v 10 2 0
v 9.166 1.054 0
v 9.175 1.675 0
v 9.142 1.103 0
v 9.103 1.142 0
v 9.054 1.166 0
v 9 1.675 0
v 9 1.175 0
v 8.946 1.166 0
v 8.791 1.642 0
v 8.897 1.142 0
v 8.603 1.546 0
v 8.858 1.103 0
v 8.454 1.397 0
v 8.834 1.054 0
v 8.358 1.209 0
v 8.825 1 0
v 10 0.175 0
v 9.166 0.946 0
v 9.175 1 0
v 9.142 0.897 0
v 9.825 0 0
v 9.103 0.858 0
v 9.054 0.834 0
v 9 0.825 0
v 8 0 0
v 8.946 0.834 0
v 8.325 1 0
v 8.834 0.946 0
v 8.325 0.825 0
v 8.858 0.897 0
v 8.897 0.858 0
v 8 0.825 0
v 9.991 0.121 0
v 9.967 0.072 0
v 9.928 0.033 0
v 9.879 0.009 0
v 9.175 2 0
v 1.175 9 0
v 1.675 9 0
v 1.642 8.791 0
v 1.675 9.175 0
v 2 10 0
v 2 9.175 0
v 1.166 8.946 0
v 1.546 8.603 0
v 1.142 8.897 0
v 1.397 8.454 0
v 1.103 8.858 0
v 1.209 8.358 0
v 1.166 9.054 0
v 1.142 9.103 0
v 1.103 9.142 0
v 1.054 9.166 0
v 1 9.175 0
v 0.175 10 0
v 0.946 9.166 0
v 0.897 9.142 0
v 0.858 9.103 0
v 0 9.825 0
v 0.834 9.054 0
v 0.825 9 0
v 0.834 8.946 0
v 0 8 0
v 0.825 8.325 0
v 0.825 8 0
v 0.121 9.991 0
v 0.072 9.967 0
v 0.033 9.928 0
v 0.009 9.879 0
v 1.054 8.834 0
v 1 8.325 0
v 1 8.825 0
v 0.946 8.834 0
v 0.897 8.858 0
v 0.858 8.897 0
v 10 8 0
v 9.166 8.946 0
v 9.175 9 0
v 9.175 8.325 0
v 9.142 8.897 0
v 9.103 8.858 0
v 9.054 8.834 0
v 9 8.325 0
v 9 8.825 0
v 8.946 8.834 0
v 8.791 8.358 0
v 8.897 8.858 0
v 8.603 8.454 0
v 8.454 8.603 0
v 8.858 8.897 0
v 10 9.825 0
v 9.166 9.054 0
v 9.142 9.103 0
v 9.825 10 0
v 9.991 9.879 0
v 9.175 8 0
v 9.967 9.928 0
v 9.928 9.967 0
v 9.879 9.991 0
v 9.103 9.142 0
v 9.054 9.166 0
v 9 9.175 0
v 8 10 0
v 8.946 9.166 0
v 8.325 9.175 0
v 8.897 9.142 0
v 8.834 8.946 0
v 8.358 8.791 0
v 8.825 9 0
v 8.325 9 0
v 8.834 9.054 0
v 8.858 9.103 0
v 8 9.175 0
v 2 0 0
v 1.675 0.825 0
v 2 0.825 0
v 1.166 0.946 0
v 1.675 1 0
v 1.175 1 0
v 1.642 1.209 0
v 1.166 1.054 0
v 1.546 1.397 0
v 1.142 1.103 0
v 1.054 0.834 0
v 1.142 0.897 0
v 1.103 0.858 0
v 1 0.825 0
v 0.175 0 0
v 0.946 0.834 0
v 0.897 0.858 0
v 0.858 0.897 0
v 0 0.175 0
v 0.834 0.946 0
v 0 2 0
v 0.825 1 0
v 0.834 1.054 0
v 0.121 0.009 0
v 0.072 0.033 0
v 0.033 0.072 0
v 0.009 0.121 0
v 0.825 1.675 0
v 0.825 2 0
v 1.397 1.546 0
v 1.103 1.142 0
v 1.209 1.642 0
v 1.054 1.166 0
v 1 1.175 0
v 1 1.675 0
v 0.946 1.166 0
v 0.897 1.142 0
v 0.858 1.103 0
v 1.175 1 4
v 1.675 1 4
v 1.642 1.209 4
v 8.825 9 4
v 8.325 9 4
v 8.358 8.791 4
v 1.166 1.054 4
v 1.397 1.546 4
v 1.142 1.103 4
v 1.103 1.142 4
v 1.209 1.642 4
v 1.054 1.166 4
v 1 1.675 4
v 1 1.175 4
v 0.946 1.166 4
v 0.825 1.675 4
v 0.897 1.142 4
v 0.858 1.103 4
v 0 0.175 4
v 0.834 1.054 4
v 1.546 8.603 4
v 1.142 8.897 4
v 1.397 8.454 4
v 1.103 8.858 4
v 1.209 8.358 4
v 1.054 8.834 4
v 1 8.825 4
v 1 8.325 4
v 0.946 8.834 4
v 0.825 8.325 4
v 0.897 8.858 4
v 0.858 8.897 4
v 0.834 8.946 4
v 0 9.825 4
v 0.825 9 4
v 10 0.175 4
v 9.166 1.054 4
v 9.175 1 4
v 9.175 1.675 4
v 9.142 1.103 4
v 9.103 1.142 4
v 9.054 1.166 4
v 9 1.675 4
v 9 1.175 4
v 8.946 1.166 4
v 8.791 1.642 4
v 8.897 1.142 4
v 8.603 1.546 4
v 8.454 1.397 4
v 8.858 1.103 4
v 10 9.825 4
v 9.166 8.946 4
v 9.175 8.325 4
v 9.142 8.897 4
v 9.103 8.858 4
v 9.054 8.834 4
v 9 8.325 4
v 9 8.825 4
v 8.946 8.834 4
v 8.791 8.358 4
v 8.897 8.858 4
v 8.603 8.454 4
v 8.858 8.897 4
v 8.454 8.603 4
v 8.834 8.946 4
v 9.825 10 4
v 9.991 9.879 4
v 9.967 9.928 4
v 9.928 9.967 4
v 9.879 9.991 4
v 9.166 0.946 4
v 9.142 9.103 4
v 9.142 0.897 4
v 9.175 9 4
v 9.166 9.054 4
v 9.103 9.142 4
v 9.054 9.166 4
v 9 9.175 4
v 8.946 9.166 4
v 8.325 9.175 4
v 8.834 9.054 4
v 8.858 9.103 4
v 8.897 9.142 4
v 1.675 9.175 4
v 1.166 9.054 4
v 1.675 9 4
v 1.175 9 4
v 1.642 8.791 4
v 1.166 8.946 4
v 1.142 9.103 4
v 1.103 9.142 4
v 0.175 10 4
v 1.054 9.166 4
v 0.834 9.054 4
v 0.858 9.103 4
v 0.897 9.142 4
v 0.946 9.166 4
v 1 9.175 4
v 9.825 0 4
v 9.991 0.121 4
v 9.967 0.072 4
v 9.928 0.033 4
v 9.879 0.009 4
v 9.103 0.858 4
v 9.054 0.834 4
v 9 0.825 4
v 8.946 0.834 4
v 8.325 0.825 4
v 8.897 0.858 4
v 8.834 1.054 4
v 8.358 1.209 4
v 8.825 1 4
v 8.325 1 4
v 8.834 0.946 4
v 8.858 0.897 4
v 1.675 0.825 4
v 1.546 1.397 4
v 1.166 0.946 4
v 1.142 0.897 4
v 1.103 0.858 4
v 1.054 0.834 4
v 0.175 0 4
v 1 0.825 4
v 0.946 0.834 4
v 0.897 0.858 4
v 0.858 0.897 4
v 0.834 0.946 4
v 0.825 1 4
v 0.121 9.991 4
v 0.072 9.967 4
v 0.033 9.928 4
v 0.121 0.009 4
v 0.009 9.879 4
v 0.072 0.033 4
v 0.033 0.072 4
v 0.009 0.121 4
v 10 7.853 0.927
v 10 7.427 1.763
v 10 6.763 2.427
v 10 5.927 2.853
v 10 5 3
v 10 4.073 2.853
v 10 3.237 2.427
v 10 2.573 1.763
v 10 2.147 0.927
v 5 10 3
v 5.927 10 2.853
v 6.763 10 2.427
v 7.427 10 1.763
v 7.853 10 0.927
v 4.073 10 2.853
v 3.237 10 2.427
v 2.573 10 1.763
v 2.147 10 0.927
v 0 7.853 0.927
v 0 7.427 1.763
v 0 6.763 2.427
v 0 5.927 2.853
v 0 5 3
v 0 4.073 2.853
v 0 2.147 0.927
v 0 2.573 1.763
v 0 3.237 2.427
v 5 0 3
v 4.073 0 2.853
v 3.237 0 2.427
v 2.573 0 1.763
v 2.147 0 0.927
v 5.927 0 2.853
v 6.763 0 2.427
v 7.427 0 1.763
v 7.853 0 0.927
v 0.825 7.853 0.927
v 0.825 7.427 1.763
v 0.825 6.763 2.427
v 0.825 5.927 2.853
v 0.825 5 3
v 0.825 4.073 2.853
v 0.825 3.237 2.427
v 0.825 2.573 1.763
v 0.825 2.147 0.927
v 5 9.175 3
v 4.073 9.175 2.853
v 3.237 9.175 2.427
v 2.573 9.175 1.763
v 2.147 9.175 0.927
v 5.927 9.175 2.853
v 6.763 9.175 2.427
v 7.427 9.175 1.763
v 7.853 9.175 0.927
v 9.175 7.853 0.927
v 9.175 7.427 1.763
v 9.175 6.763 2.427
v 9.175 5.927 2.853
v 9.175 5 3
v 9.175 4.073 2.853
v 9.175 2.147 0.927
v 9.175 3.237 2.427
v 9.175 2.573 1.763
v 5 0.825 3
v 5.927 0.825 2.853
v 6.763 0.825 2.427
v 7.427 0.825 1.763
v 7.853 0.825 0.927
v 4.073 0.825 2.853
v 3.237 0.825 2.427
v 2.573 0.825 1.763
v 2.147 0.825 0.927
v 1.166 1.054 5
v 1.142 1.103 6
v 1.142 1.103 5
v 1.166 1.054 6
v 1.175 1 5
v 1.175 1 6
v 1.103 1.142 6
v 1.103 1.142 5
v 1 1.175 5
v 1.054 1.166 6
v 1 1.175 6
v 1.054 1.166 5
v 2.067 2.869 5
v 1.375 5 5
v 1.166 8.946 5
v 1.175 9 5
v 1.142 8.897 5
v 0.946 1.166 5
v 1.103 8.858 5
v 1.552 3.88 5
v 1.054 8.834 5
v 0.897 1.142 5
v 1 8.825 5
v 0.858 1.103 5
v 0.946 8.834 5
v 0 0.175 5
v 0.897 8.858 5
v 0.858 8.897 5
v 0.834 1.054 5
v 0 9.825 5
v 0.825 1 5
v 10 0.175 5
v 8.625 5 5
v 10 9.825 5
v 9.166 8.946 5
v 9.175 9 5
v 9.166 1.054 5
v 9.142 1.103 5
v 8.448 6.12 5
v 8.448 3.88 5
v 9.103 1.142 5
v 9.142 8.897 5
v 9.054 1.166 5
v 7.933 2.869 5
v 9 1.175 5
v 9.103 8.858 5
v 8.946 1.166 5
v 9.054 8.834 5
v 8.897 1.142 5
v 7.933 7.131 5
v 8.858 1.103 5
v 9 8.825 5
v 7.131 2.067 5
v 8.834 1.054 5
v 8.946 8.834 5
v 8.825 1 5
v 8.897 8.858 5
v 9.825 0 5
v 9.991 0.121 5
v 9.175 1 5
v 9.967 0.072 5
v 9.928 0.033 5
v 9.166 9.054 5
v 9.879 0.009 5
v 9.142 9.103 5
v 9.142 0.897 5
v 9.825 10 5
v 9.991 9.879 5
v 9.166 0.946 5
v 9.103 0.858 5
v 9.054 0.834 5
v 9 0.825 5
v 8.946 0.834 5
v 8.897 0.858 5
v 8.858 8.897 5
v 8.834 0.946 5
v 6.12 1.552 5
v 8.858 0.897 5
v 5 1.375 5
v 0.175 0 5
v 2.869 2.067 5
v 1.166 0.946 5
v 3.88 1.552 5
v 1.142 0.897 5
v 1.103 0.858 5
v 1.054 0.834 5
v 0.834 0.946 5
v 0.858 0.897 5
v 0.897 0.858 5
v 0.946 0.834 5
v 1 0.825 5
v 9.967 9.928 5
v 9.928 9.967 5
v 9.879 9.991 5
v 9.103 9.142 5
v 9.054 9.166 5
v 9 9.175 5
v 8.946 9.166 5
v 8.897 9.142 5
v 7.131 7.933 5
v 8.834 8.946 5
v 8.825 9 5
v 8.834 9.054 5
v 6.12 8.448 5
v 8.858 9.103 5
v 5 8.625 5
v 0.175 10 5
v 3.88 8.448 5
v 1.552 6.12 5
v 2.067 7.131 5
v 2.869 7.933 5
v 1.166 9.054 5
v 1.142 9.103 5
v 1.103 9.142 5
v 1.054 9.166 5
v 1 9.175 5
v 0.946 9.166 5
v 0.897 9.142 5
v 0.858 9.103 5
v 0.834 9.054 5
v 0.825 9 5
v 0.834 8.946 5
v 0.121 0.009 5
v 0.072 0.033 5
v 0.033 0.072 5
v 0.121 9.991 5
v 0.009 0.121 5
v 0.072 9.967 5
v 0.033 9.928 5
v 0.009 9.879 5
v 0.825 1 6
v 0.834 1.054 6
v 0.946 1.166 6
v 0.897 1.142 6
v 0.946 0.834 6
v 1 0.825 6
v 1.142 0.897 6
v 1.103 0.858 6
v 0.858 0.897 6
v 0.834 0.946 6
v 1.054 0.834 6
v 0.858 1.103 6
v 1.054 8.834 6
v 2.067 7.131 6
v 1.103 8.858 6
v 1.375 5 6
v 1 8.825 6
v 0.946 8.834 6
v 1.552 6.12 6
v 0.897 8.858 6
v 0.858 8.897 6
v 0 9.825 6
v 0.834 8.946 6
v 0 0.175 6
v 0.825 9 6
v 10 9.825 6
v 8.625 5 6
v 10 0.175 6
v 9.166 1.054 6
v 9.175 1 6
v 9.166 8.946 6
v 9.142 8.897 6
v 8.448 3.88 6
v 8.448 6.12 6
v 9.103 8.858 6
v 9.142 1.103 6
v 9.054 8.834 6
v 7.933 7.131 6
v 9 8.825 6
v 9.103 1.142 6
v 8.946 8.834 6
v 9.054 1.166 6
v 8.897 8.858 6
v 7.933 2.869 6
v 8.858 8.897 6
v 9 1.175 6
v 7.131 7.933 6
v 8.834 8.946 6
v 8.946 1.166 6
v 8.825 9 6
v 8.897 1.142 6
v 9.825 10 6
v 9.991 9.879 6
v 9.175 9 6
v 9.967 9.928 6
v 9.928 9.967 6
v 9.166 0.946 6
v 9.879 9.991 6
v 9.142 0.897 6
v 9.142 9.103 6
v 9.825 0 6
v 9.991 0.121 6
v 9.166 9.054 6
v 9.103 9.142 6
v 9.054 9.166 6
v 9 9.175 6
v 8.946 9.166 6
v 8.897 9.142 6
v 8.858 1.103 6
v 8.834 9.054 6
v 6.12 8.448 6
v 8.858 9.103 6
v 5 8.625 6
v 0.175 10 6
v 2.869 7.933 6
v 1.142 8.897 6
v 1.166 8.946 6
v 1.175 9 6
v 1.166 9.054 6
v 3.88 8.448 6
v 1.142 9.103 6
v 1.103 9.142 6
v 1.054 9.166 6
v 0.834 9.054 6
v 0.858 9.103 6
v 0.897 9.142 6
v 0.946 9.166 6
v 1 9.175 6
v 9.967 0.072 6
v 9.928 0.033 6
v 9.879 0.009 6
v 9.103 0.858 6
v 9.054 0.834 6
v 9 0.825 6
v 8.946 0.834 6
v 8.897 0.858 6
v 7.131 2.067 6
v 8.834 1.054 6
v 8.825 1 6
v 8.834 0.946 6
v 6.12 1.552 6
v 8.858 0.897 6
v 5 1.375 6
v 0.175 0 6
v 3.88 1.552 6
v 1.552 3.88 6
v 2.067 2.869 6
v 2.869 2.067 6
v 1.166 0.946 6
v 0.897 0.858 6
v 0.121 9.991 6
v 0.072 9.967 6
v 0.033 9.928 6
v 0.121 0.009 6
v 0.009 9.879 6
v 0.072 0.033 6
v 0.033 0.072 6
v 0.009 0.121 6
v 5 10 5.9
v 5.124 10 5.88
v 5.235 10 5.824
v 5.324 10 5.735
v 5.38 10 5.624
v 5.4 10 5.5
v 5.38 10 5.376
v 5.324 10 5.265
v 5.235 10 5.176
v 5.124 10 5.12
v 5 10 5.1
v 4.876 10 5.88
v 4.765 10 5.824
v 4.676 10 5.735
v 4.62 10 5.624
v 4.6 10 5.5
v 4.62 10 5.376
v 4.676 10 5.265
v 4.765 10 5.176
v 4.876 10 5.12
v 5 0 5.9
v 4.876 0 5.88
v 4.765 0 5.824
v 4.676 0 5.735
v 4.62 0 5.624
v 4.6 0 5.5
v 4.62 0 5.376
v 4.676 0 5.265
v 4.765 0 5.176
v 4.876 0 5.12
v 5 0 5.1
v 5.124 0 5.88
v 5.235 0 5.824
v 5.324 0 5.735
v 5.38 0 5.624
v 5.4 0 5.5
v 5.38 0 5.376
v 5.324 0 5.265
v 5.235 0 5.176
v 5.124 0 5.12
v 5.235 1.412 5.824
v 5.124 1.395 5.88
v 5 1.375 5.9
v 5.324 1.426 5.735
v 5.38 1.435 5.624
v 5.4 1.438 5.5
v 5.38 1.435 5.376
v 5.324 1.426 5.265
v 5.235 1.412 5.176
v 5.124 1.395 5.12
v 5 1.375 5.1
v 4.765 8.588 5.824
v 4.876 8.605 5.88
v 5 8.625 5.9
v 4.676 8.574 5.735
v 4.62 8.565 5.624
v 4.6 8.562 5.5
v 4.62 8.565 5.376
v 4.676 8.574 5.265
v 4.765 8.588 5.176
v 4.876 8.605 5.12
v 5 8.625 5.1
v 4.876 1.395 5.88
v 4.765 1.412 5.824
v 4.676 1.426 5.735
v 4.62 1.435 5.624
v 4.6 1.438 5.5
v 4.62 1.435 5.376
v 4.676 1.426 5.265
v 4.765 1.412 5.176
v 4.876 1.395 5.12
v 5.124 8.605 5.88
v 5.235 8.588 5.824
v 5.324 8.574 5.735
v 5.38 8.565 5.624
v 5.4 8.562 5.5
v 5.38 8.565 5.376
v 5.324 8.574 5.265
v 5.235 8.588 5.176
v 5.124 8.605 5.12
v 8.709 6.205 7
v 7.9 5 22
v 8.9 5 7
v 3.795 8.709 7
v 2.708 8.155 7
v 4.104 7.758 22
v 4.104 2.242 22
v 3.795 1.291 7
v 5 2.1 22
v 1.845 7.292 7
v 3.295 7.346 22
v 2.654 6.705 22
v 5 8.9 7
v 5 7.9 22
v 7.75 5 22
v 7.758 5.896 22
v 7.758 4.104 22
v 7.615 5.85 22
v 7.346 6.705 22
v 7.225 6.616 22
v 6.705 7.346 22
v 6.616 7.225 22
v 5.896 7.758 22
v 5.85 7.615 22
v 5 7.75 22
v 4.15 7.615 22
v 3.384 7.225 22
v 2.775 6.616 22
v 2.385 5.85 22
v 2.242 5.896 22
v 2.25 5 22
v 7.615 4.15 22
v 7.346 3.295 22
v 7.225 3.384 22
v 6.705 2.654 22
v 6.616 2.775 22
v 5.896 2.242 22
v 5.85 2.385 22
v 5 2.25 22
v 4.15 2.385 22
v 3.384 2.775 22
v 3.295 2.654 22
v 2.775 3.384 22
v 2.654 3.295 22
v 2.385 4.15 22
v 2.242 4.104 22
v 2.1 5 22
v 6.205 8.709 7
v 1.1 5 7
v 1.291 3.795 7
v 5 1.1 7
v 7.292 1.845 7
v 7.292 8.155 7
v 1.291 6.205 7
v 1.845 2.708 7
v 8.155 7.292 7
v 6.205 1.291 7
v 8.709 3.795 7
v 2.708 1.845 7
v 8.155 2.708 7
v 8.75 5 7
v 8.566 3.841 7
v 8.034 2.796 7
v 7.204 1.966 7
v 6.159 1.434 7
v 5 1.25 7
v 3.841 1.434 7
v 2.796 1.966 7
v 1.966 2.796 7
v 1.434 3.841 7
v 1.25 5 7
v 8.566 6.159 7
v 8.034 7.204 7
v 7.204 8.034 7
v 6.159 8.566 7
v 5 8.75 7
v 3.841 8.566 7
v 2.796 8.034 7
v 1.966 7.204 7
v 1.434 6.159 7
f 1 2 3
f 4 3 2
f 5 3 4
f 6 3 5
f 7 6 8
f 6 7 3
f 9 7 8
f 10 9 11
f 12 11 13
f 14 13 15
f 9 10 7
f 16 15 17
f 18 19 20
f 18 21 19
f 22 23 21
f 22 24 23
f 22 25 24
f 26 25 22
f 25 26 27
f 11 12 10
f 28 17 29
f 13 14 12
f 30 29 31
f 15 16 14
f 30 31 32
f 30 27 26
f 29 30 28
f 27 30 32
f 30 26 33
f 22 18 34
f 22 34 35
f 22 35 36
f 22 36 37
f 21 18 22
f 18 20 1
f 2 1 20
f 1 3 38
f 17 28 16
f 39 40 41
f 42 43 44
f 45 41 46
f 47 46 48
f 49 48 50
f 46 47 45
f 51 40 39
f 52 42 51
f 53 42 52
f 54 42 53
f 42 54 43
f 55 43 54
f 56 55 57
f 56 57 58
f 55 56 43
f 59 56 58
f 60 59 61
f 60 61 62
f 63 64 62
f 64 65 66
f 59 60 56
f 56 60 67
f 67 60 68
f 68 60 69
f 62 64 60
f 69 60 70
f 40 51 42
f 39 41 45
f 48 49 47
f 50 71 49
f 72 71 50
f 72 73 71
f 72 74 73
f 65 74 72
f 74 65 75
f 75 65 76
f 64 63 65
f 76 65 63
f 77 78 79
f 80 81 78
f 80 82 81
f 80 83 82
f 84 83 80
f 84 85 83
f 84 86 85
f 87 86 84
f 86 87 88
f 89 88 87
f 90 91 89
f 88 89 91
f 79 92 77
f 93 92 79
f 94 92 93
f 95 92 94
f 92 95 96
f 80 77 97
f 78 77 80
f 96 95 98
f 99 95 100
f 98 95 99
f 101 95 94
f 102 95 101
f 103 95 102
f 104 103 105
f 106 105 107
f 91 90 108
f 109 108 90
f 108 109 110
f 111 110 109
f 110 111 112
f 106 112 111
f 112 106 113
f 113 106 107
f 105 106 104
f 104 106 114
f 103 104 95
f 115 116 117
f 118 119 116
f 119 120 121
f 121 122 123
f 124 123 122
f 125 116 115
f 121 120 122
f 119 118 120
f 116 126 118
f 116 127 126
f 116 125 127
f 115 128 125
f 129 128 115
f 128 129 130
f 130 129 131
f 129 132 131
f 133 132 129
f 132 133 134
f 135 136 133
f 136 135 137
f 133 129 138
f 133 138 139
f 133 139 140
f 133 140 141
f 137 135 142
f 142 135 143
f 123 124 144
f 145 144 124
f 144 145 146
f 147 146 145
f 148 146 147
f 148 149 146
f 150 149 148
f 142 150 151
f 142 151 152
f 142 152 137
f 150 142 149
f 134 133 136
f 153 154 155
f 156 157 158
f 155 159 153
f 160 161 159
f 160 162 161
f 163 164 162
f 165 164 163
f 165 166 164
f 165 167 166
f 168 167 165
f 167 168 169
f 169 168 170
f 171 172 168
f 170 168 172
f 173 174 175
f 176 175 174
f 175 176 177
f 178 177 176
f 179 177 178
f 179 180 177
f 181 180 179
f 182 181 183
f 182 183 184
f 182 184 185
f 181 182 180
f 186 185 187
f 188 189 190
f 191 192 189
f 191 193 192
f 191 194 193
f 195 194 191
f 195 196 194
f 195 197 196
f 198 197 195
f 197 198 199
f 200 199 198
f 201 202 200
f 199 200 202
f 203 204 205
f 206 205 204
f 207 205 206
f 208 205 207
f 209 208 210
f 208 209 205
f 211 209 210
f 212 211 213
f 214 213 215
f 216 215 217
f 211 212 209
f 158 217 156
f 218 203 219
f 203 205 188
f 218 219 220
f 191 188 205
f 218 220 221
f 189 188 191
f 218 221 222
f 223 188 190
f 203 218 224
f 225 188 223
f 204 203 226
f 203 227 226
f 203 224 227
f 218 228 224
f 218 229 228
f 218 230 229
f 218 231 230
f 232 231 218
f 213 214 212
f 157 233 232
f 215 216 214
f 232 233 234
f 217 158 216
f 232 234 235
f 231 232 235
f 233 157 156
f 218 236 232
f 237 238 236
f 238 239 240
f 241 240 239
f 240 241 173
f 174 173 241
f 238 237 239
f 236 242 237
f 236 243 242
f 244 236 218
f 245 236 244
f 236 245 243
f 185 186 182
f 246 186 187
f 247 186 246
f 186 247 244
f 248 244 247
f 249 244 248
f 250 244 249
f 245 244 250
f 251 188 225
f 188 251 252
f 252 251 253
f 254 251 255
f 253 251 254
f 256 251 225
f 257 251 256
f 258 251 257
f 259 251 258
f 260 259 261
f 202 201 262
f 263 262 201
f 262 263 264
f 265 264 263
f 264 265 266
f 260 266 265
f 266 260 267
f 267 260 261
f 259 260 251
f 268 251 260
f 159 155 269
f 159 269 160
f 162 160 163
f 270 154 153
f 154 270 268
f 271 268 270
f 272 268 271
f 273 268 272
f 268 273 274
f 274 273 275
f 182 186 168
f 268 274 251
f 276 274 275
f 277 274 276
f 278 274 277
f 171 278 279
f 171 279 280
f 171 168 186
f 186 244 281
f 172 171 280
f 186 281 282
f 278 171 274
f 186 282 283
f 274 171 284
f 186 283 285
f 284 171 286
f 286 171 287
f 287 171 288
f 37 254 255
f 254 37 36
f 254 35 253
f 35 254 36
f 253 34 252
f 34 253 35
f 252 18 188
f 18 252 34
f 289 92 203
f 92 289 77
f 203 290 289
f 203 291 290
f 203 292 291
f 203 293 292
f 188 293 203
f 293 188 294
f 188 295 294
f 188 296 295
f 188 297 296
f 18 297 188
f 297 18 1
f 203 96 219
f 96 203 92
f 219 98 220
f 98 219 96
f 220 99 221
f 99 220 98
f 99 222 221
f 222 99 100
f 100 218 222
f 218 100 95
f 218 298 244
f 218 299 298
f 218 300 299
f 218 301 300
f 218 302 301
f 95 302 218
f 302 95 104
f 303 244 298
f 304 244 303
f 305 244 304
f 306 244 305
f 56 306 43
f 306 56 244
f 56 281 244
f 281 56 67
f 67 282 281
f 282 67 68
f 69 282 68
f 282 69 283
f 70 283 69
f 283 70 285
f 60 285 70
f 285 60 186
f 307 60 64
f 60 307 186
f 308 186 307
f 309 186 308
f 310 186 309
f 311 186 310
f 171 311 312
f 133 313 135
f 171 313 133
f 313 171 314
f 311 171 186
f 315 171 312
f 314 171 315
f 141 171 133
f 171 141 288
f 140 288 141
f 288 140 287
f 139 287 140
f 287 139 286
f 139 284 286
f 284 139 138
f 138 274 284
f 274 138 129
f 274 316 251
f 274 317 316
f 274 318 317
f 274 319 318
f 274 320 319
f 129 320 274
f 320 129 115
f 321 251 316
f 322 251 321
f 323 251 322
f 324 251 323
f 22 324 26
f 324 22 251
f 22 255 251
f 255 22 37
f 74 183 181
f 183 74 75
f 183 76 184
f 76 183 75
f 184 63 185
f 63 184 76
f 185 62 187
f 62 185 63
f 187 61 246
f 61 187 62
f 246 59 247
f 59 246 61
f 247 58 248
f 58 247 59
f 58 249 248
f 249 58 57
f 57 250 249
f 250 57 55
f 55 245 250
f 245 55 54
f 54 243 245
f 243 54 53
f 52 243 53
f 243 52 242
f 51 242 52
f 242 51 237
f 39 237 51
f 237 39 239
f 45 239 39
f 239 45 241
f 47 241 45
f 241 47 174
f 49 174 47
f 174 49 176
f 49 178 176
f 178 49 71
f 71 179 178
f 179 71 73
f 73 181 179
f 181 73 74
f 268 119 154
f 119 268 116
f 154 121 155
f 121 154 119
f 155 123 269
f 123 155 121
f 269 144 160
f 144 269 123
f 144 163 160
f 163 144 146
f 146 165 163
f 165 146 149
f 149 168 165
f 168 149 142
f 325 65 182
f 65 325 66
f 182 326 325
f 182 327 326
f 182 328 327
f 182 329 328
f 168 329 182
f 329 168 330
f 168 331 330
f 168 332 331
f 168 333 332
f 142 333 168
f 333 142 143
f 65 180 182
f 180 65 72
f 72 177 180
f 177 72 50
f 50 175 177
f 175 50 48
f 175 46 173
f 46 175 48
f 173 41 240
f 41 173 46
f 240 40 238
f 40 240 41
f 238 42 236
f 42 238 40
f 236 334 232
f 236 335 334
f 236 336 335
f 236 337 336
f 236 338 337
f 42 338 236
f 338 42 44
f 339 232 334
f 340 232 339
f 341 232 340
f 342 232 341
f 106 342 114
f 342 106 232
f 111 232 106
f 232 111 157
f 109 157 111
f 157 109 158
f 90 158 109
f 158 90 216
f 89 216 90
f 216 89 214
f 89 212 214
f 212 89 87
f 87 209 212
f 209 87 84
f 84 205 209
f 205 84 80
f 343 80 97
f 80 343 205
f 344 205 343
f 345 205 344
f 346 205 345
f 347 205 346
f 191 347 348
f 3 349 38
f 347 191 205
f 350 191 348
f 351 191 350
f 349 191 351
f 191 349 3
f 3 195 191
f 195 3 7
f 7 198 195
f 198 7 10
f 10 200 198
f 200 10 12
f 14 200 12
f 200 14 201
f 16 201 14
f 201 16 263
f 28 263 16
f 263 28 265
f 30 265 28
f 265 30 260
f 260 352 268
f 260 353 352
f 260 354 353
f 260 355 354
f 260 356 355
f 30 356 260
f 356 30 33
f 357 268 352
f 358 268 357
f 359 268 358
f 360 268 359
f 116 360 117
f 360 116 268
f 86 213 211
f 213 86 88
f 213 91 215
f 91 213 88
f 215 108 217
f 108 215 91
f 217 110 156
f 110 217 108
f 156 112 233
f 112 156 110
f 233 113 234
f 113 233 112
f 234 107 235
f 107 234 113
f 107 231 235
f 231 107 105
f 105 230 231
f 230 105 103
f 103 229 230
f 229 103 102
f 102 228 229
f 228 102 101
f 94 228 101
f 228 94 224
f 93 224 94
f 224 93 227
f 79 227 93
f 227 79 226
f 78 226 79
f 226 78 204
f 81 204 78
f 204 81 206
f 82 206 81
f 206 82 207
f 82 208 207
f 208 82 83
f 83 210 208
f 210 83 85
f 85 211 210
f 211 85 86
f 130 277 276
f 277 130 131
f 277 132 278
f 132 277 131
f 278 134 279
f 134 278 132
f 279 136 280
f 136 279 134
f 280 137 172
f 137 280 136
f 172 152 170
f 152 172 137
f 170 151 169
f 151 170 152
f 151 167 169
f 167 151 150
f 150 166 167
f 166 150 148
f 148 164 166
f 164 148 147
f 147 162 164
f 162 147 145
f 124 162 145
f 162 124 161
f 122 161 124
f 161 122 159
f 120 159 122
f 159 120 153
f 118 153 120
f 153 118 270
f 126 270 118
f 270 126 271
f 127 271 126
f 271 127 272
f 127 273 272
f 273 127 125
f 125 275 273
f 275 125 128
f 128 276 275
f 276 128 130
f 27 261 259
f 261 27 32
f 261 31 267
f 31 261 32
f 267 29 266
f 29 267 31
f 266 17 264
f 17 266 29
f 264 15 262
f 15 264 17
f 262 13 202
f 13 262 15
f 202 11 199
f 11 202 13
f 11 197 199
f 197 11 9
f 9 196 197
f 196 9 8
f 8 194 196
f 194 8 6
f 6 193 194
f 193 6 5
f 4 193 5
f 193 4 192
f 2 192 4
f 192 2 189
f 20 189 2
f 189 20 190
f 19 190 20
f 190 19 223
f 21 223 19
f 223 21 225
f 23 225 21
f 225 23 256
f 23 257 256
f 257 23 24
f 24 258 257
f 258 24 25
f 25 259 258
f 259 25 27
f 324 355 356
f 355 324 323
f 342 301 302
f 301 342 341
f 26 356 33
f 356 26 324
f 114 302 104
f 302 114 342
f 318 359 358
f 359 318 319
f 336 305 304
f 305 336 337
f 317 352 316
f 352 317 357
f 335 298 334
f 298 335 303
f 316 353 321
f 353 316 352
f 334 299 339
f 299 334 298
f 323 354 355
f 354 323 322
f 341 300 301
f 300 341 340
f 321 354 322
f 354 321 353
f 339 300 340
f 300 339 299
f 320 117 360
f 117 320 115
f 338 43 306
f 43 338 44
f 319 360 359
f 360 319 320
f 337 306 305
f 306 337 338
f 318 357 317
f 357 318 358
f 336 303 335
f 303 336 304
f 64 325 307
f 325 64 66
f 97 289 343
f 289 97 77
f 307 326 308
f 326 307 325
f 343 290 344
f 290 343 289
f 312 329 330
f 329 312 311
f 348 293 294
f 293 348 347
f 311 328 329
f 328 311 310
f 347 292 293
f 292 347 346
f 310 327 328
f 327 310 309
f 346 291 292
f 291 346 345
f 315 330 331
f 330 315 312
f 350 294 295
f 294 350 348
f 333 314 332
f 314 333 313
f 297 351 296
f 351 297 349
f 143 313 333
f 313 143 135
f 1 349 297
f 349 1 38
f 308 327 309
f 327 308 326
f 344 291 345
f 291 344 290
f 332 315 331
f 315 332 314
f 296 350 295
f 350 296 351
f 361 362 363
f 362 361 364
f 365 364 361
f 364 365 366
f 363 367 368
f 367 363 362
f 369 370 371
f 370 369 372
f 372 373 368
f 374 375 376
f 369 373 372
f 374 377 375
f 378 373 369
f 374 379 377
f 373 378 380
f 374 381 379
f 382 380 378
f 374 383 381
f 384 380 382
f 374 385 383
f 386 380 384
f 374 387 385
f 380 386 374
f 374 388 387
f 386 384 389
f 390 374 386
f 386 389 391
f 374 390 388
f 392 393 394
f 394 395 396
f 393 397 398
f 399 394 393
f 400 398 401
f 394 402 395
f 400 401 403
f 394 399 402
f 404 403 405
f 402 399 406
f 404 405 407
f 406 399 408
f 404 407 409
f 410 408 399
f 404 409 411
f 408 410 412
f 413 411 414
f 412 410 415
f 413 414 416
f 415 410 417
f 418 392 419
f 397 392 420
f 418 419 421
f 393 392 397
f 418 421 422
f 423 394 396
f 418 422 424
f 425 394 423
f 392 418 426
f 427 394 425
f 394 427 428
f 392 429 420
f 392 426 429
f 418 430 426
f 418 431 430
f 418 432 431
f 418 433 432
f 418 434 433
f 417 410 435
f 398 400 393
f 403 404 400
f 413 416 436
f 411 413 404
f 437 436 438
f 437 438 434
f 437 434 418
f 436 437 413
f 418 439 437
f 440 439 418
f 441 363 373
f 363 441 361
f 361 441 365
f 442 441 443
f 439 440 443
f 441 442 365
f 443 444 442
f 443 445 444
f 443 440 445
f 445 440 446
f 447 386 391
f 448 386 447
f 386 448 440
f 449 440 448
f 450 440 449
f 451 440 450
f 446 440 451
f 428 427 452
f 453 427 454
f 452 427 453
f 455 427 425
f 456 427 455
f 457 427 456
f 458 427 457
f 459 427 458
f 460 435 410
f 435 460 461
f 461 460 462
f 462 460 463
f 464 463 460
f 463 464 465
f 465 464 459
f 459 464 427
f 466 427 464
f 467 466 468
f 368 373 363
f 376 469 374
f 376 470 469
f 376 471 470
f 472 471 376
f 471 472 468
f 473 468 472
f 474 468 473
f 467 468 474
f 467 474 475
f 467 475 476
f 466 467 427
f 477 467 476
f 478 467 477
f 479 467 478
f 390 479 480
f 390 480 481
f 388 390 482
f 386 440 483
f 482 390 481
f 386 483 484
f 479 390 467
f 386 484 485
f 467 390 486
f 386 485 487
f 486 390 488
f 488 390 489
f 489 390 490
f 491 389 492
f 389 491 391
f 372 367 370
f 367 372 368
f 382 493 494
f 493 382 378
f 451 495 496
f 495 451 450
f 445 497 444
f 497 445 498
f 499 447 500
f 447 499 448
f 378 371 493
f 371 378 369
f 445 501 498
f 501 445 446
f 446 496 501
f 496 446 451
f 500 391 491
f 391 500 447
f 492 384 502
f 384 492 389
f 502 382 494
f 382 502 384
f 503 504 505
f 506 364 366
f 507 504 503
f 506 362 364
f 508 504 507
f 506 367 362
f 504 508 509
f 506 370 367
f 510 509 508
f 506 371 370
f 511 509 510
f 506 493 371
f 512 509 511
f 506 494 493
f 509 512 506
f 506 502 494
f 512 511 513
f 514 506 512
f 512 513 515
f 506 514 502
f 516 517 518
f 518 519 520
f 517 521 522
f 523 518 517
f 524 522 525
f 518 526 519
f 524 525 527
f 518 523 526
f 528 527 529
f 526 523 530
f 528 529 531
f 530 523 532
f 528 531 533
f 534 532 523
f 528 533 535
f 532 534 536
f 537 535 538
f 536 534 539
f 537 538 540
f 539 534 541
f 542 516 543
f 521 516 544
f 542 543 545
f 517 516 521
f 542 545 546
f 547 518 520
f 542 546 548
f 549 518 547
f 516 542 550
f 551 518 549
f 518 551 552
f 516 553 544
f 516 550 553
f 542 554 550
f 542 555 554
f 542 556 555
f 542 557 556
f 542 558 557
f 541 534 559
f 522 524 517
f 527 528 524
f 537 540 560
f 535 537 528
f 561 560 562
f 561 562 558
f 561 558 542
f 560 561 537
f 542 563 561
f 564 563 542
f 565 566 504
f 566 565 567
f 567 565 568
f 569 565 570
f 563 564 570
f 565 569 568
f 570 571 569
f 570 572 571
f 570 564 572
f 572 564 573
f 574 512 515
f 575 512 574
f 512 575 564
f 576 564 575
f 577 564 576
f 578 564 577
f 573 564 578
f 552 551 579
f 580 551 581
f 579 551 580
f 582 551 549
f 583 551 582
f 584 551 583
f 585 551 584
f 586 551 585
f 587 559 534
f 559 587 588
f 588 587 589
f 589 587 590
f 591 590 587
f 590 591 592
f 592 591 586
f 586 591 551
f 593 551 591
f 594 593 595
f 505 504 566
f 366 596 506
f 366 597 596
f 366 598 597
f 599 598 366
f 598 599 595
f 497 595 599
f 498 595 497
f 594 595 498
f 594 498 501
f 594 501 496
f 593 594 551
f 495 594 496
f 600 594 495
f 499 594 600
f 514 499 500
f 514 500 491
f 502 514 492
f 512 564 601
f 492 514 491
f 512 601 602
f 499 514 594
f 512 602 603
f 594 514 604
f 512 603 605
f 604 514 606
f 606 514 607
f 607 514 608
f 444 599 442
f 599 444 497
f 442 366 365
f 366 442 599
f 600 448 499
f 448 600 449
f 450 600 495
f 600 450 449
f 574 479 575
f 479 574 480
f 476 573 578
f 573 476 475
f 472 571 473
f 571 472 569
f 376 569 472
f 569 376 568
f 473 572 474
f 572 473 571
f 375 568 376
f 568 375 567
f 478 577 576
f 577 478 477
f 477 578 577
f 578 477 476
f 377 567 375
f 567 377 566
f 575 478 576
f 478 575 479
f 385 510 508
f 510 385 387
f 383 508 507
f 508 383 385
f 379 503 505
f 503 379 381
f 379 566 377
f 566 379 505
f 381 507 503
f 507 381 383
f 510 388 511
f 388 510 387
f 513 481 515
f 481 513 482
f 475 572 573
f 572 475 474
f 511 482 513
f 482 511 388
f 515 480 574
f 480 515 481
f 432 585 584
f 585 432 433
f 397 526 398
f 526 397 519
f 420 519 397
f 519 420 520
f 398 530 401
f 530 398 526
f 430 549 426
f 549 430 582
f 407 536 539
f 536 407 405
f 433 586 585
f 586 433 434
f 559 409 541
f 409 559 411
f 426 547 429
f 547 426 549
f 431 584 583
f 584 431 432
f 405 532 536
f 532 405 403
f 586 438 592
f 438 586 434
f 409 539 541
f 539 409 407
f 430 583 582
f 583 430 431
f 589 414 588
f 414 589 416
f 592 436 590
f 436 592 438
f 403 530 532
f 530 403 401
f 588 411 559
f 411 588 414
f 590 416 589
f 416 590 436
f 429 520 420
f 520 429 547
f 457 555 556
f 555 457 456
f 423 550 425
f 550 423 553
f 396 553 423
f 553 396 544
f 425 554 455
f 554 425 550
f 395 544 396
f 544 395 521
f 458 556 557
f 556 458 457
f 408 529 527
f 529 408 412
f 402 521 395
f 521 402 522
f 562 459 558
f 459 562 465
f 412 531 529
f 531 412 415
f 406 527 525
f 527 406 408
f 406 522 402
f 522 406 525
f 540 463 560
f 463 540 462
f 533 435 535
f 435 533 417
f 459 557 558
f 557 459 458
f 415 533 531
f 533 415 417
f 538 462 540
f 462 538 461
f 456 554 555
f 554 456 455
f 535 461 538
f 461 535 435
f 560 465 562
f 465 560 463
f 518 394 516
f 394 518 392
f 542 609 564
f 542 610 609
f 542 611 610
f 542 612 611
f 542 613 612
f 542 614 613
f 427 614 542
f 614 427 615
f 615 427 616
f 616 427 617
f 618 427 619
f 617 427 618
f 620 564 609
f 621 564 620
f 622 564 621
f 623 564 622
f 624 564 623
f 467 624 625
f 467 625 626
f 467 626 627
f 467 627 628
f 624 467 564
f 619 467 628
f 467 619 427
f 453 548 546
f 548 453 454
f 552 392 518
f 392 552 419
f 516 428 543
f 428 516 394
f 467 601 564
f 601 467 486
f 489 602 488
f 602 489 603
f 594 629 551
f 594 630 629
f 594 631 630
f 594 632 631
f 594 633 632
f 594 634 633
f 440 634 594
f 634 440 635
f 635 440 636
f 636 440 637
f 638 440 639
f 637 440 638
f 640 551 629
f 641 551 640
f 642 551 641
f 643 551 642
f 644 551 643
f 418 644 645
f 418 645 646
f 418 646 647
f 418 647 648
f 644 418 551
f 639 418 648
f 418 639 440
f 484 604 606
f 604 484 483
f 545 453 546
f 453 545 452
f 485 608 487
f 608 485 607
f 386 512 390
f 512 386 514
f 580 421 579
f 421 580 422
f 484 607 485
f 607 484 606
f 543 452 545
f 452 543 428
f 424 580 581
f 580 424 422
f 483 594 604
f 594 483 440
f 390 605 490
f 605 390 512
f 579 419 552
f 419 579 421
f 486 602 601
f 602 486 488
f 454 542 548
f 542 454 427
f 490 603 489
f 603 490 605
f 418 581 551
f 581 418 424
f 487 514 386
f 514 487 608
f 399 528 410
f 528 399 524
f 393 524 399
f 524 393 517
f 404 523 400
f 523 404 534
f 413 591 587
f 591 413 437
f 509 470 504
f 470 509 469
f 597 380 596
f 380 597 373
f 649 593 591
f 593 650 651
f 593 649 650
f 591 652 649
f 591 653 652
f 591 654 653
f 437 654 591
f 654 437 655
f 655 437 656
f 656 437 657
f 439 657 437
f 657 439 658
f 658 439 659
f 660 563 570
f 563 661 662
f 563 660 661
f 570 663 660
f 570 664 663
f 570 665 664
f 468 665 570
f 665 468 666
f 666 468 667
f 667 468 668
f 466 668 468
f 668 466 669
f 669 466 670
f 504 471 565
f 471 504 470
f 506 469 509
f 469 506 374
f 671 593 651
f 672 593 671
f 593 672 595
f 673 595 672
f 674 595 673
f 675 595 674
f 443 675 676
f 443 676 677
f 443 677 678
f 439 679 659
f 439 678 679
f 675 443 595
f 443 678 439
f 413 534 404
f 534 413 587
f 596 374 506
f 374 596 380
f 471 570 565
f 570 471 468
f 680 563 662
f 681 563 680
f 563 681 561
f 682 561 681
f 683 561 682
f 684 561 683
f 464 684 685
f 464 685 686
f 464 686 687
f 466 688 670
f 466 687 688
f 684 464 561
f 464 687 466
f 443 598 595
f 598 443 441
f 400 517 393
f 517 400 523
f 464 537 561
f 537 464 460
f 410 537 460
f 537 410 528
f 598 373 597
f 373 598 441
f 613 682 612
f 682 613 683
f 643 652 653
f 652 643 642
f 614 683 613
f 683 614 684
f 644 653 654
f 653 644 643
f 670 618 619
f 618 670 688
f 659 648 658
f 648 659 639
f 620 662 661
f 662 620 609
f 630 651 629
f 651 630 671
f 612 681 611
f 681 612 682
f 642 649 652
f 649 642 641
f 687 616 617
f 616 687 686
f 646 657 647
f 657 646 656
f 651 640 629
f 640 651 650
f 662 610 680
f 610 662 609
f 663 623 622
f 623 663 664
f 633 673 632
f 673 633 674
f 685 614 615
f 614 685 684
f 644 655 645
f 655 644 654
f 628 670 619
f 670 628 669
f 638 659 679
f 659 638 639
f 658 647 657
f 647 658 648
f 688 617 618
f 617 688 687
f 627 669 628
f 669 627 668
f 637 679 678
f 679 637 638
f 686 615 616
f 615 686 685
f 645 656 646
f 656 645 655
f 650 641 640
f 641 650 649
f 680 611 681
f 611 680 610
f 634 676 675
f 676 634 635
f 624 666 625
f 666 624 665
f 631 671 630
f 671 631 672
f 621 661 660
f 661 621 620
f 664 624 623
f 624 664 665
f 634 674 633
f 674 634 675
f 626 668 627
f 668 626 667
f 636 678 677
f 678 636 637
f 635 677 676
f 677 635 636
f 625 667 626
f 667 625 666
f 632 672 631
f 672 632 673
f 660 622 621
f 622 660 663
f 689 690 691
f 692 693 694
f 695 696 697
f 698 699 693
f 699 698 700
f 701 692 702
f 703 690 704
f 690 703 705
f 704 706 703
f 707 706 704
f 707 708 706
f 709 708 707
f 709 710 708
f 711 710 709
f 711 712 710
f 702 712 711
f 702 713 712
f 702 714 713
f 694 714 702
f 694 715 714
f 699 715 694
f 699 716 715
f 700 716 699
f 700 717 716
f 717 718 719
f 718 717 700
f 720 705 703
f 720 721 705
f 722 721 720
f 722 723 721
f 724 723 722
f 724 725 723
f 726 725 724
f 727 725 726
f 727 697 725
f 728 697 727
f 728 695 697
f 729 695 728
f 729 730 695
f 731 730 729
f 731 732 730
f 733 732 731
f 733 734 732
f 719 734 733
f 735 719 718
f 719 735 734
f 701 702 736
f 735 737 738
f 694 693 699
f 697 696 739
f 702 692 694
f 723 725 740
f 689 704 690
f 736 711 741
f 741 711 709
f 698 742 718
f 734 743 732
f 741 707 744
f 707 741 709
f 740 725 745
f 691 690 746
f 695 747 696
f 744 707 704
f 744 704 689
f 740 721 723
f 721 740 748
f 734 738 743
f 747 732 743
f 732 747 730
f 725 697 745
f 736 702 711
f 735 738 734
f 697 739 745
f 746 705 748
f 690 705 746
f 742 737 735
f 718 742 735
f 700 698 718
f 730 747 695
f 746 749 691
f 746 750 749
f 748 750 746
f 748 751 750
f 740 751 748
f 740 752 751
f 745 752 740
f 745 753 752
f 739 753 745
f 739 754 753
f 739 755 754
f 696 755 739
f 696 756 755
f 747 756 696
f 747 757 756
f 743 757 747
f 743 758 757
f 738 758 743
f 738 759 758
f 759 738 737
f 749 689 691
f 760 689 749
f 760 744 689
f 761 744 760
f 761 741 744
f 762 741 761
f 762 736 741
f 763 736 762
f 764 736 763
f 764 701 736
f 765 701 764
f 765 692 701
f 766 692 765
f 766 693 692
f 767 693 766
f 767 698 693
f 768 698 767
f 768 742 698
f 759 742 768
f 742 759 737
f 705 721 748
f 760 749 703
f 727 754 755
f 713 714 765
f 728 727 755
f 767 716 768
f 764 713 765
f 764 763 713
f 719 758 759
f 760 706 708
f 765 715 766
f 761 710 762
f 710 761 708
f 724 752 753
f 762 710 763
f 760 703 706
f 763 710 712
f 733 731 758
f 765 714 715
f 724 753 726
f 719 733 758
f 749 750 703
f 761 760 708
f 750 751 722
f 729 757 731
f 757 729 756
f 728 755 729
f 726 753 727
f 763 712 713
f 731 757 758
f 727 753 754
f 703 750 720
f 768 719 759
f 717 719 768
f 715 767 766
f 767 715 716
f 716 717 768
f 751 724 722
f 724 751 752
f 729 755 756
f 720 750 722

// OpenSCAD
 /*
Title: Hair Dryer Fan Holder Base
Copyright: Jet Flener 2024
Author: Jet Flener - jetflener@ou.edu
License: GNU GPL v3
Encoding: UTF-8
Version: 0.1.0-alpha
Description: An adapter to hold a hair dryer fan, for use with a duct.

This code has units in cm. Rescale for printing. The original design for the mount is taken from OPENSCAD Library file by the DoomMeister Mounting surround for small DC fans (25 - 120mm).  Clamps require an M3 bolt.
*/

//render everything
render(){
    difference(){
        fan_mount(size=10,thick=4);
        
         translate([5, 10, 0])rotate([90, 0, 0])fanBaseCutOut();
            translate([0, 5, 0])rotate([90, 0, 90])fanBaseCutOut();
        
    }
    
    //use the translates to adjust viewing positions
    translate([0, 0, 5])fanDuctBasePlate();
    translate([0, 0, 7])fanDuct();
    
    
}

module fanBaseCutOut(){
    cylinder(h=10, r = 3);
    $fn=20;
}
module fanDuctBasePlate(){
    
    difference(){
        roundedcube([10, 10, 1], radius = 0.35/2, apply_to = "z");
        translate([5, 5, 0])cylinder(h=1, d=7.25);
        translate([1, 1, 0.5])fanDuctBasePlateMountingHoles(); 
        fanDuctBasePlateClampHole();
    }
    
    
    $fn = 20; 
}

module fanDuctBasePlateMountingHoles(){
    translate([0, 0, 0])cylinder(h=1, d=0.35, center=true);
    translate([0, 8, 0])cylinder(h=1, d=0.35, center=true);
    translate([8, 0, 0])cylinder(h=1, d=0.35, center=true);
    translate([8, 8, 0])cylinder(h=1, d=0.35, center=true);
}
module fanDuctBasePlateClampHole(){
    //M8 screw
    translate([5, 5, 0.5])rotate([90,0,0])cylinder(h=10,d=0.8,center=true);

   
}
module fanDuct(){
    translate([5, 5, 0])difference(){
        cylinder(h=15, d1=7.8, d2=5.8);
        cylinder(h=15, d1=7.5, d2=5.5);
        
    }
   
    $fn = 20;
}

module fanDuctRotate(){
     //need to add rotated cylinder
    
    
}

































//rounded cube for jet
// Higher definition curves
//$fs = 0.01;

module roundedcube(size = [1, 1, 1], center = false, radius = 0.5, apply_to = "all") {
    $fs = 0.1;
	// If single value, convert to [x, y, z] vector
	size = (size[0] == undef) ? [size, size, size] : size;

	translate_min = radius;
	translate_xmax = size[0] - radius;
	translate_ymax = size[1] - radius;
	translate_zmax = size[2] - radius;

	diameter = radius * 2;

	module build_point(type = "sphere", rotate = [0, 0, 0]) {
		if (type == "sphere") {
			sphere(r = radius);
		} else if (type == "cylinder") {
			rotate(a = rotate)
			cylinder(h = diameter, r = radius, center = true);
		}
	}

	obj_translate = (center == false) ?
		[0, 0, 0] : [
			-(size[0] / 2),
			-(size[1] / 2),
			-(size[2] / 2)
		];

	translate(v = obj_translate) {
		hull() {
			for (translate_x = [translate_min, translate_xmax]) {
				x_at = (translate_x == translate_min) ? "min" : "max";
				for (translate_y = [translate_min, translate_ymax]) {
					y_at = (translate_y == translate_min) ? "min" : "max";
					for (translate_z = [translate_min, translate_zmax]) {
						z_at = (translate_z == translate_min) ? "min" : "max";

						translate(v = [translate_x, translate_y, translate_z])
						if (
							(apply_to == "all") ||
							(apply_to == "xmin" && x_at == "min") || (apply_to == "xmax" && x_at == "max") ||
							(apply_to == "ymin" && y_at == "min") || (apply_to == "ymax" && y_at == "max") ||
							(apply_to == "zmin" && z_at == "min") || (apply_to == "zmax" && z_at == "max")
						) {
							build_point("sphere");
						} else {
							rotate = 
								(apply_to == "xmin" || apply_to == "xmax" || apply_to == "x") ? [0, 90, 0] : (
								(apply_to == "ymin" || apply_to == "ymax" || apply_to == "y") ? [90, 90, 0] :
								[0, 0, 0]
							);
							build_point("cylinder", rotate);
						}
					}
				}
			}
		}
	}
}


//fan stuff
module fan_mount(size=40,thick = 4)
{
if(size == 18)
    {
	_fan_mount(
			fan_size = 18,
			fan_mounting_pitch = 15.22,
			fan_m_hole_dia = .35,
			holder_thickness = thick
		 );
	}
if(size == 10)
	{
	_fan_mount(
			fan_size = 10,
			fan_mounting_pitch = 8,
			fan_m_hole_dia = .35,
			holder_thickness = thick
		 );
	}
if(size == 30)
	{
	_fan_mount(
			fan_size = 30,
			fan_mounting_pitch = 24,
			fan_m_hole_dia = 3,
			holder_thickness = thick
		 );
	}

if(size == 40)
	{
	_fan_mount(
			fan_size = 40,
			fan_mounting_pitch = 32,
			fan_m_hole_dia = 3.5,
			holder_thickness = thick
		 );
	}
if(size == 45)
	{
	_fan_mount(
			fan_size = 45,
			fan_mounting_pitch = 37,
			fan_m_hole_dia = 4.3,
			holder_thickness = thick
		 );
	}
if(size == 60)
	{
	_fan_mount(
			fan_size = 60,
			fan_mounting_pitch = 50,
			fan_m_hole_dia = 4.4,
			holder_thickness = thick
		 );
	}
if(size == 80)
	{
	_fan_mount(
			fan_size = 80,
			fan_mounting_pitch = 71.5,
			fan_m_hole_dia = 4.4,
			holder_thickness = thick
		 );
	}

if(size == 120)
	{
	_fan_mount(
			fan_size = 120,
			fan_mounting_pitch = 105,
			fan_m_hole_dia = 4.4,
			holder_thickness = thick
		 );
	}
}


//inner module
module _fan_mount(
			fan_size, //nominsl size of fan
			fan_mounting_pitch, //pitch between mounting holes
			fan_m_hole_dia, //mounting hole diameter
			holder_thickness //user defined thickness
		 )
{

offset1 = (fan_size-(fan_mounting_pitch + fan_m_hole_dia))/2;
offset2 = (fan_size-(fan_mounting_pitch))/2;
offset3 = offset2 + fan_mounting_pitch;
thickness = (fan_size-fan_mounting_pitch)/2;	
			
			//difference()
			//{
			linear_extrude(height = holder_thickness)
			union()
			{	
			difference()
			{
				translate([fan_m_hole_dia/2,fan_m_hole_dia/2,0])
				minkowski()
				{	
					square([fan_size - fan_m_hole_dia,fan_size - fan_m_hole_dia]);
					circle(r= fan_m_hole_dia/2, $fn=20);
				}
			
					translate([offset1,offset1,0])
					square([fan_mounting_pitch + fan_m_hole_dia,fan_mounting_pitch + fan_m_hole_dia]);
				}
				translate([offset2,offset2,0])
				rotate([0,0,0])_corner_hole();
				translate([offset3,offset2,0])
				rotate([0,0,90])_corner_hole();
				translate([offset2,offset3,0])
				rotate([0,0,90])_corner_hole();
				translate([offset3,offset3,0])
				rotate([0,0,0])_corner_hole();
			}

module _corner_hole()
{
				difference(){
					union(){
							difference(){
							square([fan_m_hole_dia + thickness,fan_m_hole_dia + thickness],center=true);
							square([(fan_m_hole_dia + thickness)/2,(fan_m_hole_dia + thickness)/2],center=false);
							translate([-(fan_m_hole_dia + thickness)/2,-(fan_m_hole_dia + thickness)/2])
							square([(fan_m_hole_dia + thickness)/2,(fan_m_hole_dia + thickness)/2],center=false);
							}
					circle(r=(fan_m_hole_dia + thickness)/2, $fn=20);
					}
					circle(r=(fan_m_hole_dia)/2, $fn=20);
				}
}


echo(offset1,offset2,thickness);
}
